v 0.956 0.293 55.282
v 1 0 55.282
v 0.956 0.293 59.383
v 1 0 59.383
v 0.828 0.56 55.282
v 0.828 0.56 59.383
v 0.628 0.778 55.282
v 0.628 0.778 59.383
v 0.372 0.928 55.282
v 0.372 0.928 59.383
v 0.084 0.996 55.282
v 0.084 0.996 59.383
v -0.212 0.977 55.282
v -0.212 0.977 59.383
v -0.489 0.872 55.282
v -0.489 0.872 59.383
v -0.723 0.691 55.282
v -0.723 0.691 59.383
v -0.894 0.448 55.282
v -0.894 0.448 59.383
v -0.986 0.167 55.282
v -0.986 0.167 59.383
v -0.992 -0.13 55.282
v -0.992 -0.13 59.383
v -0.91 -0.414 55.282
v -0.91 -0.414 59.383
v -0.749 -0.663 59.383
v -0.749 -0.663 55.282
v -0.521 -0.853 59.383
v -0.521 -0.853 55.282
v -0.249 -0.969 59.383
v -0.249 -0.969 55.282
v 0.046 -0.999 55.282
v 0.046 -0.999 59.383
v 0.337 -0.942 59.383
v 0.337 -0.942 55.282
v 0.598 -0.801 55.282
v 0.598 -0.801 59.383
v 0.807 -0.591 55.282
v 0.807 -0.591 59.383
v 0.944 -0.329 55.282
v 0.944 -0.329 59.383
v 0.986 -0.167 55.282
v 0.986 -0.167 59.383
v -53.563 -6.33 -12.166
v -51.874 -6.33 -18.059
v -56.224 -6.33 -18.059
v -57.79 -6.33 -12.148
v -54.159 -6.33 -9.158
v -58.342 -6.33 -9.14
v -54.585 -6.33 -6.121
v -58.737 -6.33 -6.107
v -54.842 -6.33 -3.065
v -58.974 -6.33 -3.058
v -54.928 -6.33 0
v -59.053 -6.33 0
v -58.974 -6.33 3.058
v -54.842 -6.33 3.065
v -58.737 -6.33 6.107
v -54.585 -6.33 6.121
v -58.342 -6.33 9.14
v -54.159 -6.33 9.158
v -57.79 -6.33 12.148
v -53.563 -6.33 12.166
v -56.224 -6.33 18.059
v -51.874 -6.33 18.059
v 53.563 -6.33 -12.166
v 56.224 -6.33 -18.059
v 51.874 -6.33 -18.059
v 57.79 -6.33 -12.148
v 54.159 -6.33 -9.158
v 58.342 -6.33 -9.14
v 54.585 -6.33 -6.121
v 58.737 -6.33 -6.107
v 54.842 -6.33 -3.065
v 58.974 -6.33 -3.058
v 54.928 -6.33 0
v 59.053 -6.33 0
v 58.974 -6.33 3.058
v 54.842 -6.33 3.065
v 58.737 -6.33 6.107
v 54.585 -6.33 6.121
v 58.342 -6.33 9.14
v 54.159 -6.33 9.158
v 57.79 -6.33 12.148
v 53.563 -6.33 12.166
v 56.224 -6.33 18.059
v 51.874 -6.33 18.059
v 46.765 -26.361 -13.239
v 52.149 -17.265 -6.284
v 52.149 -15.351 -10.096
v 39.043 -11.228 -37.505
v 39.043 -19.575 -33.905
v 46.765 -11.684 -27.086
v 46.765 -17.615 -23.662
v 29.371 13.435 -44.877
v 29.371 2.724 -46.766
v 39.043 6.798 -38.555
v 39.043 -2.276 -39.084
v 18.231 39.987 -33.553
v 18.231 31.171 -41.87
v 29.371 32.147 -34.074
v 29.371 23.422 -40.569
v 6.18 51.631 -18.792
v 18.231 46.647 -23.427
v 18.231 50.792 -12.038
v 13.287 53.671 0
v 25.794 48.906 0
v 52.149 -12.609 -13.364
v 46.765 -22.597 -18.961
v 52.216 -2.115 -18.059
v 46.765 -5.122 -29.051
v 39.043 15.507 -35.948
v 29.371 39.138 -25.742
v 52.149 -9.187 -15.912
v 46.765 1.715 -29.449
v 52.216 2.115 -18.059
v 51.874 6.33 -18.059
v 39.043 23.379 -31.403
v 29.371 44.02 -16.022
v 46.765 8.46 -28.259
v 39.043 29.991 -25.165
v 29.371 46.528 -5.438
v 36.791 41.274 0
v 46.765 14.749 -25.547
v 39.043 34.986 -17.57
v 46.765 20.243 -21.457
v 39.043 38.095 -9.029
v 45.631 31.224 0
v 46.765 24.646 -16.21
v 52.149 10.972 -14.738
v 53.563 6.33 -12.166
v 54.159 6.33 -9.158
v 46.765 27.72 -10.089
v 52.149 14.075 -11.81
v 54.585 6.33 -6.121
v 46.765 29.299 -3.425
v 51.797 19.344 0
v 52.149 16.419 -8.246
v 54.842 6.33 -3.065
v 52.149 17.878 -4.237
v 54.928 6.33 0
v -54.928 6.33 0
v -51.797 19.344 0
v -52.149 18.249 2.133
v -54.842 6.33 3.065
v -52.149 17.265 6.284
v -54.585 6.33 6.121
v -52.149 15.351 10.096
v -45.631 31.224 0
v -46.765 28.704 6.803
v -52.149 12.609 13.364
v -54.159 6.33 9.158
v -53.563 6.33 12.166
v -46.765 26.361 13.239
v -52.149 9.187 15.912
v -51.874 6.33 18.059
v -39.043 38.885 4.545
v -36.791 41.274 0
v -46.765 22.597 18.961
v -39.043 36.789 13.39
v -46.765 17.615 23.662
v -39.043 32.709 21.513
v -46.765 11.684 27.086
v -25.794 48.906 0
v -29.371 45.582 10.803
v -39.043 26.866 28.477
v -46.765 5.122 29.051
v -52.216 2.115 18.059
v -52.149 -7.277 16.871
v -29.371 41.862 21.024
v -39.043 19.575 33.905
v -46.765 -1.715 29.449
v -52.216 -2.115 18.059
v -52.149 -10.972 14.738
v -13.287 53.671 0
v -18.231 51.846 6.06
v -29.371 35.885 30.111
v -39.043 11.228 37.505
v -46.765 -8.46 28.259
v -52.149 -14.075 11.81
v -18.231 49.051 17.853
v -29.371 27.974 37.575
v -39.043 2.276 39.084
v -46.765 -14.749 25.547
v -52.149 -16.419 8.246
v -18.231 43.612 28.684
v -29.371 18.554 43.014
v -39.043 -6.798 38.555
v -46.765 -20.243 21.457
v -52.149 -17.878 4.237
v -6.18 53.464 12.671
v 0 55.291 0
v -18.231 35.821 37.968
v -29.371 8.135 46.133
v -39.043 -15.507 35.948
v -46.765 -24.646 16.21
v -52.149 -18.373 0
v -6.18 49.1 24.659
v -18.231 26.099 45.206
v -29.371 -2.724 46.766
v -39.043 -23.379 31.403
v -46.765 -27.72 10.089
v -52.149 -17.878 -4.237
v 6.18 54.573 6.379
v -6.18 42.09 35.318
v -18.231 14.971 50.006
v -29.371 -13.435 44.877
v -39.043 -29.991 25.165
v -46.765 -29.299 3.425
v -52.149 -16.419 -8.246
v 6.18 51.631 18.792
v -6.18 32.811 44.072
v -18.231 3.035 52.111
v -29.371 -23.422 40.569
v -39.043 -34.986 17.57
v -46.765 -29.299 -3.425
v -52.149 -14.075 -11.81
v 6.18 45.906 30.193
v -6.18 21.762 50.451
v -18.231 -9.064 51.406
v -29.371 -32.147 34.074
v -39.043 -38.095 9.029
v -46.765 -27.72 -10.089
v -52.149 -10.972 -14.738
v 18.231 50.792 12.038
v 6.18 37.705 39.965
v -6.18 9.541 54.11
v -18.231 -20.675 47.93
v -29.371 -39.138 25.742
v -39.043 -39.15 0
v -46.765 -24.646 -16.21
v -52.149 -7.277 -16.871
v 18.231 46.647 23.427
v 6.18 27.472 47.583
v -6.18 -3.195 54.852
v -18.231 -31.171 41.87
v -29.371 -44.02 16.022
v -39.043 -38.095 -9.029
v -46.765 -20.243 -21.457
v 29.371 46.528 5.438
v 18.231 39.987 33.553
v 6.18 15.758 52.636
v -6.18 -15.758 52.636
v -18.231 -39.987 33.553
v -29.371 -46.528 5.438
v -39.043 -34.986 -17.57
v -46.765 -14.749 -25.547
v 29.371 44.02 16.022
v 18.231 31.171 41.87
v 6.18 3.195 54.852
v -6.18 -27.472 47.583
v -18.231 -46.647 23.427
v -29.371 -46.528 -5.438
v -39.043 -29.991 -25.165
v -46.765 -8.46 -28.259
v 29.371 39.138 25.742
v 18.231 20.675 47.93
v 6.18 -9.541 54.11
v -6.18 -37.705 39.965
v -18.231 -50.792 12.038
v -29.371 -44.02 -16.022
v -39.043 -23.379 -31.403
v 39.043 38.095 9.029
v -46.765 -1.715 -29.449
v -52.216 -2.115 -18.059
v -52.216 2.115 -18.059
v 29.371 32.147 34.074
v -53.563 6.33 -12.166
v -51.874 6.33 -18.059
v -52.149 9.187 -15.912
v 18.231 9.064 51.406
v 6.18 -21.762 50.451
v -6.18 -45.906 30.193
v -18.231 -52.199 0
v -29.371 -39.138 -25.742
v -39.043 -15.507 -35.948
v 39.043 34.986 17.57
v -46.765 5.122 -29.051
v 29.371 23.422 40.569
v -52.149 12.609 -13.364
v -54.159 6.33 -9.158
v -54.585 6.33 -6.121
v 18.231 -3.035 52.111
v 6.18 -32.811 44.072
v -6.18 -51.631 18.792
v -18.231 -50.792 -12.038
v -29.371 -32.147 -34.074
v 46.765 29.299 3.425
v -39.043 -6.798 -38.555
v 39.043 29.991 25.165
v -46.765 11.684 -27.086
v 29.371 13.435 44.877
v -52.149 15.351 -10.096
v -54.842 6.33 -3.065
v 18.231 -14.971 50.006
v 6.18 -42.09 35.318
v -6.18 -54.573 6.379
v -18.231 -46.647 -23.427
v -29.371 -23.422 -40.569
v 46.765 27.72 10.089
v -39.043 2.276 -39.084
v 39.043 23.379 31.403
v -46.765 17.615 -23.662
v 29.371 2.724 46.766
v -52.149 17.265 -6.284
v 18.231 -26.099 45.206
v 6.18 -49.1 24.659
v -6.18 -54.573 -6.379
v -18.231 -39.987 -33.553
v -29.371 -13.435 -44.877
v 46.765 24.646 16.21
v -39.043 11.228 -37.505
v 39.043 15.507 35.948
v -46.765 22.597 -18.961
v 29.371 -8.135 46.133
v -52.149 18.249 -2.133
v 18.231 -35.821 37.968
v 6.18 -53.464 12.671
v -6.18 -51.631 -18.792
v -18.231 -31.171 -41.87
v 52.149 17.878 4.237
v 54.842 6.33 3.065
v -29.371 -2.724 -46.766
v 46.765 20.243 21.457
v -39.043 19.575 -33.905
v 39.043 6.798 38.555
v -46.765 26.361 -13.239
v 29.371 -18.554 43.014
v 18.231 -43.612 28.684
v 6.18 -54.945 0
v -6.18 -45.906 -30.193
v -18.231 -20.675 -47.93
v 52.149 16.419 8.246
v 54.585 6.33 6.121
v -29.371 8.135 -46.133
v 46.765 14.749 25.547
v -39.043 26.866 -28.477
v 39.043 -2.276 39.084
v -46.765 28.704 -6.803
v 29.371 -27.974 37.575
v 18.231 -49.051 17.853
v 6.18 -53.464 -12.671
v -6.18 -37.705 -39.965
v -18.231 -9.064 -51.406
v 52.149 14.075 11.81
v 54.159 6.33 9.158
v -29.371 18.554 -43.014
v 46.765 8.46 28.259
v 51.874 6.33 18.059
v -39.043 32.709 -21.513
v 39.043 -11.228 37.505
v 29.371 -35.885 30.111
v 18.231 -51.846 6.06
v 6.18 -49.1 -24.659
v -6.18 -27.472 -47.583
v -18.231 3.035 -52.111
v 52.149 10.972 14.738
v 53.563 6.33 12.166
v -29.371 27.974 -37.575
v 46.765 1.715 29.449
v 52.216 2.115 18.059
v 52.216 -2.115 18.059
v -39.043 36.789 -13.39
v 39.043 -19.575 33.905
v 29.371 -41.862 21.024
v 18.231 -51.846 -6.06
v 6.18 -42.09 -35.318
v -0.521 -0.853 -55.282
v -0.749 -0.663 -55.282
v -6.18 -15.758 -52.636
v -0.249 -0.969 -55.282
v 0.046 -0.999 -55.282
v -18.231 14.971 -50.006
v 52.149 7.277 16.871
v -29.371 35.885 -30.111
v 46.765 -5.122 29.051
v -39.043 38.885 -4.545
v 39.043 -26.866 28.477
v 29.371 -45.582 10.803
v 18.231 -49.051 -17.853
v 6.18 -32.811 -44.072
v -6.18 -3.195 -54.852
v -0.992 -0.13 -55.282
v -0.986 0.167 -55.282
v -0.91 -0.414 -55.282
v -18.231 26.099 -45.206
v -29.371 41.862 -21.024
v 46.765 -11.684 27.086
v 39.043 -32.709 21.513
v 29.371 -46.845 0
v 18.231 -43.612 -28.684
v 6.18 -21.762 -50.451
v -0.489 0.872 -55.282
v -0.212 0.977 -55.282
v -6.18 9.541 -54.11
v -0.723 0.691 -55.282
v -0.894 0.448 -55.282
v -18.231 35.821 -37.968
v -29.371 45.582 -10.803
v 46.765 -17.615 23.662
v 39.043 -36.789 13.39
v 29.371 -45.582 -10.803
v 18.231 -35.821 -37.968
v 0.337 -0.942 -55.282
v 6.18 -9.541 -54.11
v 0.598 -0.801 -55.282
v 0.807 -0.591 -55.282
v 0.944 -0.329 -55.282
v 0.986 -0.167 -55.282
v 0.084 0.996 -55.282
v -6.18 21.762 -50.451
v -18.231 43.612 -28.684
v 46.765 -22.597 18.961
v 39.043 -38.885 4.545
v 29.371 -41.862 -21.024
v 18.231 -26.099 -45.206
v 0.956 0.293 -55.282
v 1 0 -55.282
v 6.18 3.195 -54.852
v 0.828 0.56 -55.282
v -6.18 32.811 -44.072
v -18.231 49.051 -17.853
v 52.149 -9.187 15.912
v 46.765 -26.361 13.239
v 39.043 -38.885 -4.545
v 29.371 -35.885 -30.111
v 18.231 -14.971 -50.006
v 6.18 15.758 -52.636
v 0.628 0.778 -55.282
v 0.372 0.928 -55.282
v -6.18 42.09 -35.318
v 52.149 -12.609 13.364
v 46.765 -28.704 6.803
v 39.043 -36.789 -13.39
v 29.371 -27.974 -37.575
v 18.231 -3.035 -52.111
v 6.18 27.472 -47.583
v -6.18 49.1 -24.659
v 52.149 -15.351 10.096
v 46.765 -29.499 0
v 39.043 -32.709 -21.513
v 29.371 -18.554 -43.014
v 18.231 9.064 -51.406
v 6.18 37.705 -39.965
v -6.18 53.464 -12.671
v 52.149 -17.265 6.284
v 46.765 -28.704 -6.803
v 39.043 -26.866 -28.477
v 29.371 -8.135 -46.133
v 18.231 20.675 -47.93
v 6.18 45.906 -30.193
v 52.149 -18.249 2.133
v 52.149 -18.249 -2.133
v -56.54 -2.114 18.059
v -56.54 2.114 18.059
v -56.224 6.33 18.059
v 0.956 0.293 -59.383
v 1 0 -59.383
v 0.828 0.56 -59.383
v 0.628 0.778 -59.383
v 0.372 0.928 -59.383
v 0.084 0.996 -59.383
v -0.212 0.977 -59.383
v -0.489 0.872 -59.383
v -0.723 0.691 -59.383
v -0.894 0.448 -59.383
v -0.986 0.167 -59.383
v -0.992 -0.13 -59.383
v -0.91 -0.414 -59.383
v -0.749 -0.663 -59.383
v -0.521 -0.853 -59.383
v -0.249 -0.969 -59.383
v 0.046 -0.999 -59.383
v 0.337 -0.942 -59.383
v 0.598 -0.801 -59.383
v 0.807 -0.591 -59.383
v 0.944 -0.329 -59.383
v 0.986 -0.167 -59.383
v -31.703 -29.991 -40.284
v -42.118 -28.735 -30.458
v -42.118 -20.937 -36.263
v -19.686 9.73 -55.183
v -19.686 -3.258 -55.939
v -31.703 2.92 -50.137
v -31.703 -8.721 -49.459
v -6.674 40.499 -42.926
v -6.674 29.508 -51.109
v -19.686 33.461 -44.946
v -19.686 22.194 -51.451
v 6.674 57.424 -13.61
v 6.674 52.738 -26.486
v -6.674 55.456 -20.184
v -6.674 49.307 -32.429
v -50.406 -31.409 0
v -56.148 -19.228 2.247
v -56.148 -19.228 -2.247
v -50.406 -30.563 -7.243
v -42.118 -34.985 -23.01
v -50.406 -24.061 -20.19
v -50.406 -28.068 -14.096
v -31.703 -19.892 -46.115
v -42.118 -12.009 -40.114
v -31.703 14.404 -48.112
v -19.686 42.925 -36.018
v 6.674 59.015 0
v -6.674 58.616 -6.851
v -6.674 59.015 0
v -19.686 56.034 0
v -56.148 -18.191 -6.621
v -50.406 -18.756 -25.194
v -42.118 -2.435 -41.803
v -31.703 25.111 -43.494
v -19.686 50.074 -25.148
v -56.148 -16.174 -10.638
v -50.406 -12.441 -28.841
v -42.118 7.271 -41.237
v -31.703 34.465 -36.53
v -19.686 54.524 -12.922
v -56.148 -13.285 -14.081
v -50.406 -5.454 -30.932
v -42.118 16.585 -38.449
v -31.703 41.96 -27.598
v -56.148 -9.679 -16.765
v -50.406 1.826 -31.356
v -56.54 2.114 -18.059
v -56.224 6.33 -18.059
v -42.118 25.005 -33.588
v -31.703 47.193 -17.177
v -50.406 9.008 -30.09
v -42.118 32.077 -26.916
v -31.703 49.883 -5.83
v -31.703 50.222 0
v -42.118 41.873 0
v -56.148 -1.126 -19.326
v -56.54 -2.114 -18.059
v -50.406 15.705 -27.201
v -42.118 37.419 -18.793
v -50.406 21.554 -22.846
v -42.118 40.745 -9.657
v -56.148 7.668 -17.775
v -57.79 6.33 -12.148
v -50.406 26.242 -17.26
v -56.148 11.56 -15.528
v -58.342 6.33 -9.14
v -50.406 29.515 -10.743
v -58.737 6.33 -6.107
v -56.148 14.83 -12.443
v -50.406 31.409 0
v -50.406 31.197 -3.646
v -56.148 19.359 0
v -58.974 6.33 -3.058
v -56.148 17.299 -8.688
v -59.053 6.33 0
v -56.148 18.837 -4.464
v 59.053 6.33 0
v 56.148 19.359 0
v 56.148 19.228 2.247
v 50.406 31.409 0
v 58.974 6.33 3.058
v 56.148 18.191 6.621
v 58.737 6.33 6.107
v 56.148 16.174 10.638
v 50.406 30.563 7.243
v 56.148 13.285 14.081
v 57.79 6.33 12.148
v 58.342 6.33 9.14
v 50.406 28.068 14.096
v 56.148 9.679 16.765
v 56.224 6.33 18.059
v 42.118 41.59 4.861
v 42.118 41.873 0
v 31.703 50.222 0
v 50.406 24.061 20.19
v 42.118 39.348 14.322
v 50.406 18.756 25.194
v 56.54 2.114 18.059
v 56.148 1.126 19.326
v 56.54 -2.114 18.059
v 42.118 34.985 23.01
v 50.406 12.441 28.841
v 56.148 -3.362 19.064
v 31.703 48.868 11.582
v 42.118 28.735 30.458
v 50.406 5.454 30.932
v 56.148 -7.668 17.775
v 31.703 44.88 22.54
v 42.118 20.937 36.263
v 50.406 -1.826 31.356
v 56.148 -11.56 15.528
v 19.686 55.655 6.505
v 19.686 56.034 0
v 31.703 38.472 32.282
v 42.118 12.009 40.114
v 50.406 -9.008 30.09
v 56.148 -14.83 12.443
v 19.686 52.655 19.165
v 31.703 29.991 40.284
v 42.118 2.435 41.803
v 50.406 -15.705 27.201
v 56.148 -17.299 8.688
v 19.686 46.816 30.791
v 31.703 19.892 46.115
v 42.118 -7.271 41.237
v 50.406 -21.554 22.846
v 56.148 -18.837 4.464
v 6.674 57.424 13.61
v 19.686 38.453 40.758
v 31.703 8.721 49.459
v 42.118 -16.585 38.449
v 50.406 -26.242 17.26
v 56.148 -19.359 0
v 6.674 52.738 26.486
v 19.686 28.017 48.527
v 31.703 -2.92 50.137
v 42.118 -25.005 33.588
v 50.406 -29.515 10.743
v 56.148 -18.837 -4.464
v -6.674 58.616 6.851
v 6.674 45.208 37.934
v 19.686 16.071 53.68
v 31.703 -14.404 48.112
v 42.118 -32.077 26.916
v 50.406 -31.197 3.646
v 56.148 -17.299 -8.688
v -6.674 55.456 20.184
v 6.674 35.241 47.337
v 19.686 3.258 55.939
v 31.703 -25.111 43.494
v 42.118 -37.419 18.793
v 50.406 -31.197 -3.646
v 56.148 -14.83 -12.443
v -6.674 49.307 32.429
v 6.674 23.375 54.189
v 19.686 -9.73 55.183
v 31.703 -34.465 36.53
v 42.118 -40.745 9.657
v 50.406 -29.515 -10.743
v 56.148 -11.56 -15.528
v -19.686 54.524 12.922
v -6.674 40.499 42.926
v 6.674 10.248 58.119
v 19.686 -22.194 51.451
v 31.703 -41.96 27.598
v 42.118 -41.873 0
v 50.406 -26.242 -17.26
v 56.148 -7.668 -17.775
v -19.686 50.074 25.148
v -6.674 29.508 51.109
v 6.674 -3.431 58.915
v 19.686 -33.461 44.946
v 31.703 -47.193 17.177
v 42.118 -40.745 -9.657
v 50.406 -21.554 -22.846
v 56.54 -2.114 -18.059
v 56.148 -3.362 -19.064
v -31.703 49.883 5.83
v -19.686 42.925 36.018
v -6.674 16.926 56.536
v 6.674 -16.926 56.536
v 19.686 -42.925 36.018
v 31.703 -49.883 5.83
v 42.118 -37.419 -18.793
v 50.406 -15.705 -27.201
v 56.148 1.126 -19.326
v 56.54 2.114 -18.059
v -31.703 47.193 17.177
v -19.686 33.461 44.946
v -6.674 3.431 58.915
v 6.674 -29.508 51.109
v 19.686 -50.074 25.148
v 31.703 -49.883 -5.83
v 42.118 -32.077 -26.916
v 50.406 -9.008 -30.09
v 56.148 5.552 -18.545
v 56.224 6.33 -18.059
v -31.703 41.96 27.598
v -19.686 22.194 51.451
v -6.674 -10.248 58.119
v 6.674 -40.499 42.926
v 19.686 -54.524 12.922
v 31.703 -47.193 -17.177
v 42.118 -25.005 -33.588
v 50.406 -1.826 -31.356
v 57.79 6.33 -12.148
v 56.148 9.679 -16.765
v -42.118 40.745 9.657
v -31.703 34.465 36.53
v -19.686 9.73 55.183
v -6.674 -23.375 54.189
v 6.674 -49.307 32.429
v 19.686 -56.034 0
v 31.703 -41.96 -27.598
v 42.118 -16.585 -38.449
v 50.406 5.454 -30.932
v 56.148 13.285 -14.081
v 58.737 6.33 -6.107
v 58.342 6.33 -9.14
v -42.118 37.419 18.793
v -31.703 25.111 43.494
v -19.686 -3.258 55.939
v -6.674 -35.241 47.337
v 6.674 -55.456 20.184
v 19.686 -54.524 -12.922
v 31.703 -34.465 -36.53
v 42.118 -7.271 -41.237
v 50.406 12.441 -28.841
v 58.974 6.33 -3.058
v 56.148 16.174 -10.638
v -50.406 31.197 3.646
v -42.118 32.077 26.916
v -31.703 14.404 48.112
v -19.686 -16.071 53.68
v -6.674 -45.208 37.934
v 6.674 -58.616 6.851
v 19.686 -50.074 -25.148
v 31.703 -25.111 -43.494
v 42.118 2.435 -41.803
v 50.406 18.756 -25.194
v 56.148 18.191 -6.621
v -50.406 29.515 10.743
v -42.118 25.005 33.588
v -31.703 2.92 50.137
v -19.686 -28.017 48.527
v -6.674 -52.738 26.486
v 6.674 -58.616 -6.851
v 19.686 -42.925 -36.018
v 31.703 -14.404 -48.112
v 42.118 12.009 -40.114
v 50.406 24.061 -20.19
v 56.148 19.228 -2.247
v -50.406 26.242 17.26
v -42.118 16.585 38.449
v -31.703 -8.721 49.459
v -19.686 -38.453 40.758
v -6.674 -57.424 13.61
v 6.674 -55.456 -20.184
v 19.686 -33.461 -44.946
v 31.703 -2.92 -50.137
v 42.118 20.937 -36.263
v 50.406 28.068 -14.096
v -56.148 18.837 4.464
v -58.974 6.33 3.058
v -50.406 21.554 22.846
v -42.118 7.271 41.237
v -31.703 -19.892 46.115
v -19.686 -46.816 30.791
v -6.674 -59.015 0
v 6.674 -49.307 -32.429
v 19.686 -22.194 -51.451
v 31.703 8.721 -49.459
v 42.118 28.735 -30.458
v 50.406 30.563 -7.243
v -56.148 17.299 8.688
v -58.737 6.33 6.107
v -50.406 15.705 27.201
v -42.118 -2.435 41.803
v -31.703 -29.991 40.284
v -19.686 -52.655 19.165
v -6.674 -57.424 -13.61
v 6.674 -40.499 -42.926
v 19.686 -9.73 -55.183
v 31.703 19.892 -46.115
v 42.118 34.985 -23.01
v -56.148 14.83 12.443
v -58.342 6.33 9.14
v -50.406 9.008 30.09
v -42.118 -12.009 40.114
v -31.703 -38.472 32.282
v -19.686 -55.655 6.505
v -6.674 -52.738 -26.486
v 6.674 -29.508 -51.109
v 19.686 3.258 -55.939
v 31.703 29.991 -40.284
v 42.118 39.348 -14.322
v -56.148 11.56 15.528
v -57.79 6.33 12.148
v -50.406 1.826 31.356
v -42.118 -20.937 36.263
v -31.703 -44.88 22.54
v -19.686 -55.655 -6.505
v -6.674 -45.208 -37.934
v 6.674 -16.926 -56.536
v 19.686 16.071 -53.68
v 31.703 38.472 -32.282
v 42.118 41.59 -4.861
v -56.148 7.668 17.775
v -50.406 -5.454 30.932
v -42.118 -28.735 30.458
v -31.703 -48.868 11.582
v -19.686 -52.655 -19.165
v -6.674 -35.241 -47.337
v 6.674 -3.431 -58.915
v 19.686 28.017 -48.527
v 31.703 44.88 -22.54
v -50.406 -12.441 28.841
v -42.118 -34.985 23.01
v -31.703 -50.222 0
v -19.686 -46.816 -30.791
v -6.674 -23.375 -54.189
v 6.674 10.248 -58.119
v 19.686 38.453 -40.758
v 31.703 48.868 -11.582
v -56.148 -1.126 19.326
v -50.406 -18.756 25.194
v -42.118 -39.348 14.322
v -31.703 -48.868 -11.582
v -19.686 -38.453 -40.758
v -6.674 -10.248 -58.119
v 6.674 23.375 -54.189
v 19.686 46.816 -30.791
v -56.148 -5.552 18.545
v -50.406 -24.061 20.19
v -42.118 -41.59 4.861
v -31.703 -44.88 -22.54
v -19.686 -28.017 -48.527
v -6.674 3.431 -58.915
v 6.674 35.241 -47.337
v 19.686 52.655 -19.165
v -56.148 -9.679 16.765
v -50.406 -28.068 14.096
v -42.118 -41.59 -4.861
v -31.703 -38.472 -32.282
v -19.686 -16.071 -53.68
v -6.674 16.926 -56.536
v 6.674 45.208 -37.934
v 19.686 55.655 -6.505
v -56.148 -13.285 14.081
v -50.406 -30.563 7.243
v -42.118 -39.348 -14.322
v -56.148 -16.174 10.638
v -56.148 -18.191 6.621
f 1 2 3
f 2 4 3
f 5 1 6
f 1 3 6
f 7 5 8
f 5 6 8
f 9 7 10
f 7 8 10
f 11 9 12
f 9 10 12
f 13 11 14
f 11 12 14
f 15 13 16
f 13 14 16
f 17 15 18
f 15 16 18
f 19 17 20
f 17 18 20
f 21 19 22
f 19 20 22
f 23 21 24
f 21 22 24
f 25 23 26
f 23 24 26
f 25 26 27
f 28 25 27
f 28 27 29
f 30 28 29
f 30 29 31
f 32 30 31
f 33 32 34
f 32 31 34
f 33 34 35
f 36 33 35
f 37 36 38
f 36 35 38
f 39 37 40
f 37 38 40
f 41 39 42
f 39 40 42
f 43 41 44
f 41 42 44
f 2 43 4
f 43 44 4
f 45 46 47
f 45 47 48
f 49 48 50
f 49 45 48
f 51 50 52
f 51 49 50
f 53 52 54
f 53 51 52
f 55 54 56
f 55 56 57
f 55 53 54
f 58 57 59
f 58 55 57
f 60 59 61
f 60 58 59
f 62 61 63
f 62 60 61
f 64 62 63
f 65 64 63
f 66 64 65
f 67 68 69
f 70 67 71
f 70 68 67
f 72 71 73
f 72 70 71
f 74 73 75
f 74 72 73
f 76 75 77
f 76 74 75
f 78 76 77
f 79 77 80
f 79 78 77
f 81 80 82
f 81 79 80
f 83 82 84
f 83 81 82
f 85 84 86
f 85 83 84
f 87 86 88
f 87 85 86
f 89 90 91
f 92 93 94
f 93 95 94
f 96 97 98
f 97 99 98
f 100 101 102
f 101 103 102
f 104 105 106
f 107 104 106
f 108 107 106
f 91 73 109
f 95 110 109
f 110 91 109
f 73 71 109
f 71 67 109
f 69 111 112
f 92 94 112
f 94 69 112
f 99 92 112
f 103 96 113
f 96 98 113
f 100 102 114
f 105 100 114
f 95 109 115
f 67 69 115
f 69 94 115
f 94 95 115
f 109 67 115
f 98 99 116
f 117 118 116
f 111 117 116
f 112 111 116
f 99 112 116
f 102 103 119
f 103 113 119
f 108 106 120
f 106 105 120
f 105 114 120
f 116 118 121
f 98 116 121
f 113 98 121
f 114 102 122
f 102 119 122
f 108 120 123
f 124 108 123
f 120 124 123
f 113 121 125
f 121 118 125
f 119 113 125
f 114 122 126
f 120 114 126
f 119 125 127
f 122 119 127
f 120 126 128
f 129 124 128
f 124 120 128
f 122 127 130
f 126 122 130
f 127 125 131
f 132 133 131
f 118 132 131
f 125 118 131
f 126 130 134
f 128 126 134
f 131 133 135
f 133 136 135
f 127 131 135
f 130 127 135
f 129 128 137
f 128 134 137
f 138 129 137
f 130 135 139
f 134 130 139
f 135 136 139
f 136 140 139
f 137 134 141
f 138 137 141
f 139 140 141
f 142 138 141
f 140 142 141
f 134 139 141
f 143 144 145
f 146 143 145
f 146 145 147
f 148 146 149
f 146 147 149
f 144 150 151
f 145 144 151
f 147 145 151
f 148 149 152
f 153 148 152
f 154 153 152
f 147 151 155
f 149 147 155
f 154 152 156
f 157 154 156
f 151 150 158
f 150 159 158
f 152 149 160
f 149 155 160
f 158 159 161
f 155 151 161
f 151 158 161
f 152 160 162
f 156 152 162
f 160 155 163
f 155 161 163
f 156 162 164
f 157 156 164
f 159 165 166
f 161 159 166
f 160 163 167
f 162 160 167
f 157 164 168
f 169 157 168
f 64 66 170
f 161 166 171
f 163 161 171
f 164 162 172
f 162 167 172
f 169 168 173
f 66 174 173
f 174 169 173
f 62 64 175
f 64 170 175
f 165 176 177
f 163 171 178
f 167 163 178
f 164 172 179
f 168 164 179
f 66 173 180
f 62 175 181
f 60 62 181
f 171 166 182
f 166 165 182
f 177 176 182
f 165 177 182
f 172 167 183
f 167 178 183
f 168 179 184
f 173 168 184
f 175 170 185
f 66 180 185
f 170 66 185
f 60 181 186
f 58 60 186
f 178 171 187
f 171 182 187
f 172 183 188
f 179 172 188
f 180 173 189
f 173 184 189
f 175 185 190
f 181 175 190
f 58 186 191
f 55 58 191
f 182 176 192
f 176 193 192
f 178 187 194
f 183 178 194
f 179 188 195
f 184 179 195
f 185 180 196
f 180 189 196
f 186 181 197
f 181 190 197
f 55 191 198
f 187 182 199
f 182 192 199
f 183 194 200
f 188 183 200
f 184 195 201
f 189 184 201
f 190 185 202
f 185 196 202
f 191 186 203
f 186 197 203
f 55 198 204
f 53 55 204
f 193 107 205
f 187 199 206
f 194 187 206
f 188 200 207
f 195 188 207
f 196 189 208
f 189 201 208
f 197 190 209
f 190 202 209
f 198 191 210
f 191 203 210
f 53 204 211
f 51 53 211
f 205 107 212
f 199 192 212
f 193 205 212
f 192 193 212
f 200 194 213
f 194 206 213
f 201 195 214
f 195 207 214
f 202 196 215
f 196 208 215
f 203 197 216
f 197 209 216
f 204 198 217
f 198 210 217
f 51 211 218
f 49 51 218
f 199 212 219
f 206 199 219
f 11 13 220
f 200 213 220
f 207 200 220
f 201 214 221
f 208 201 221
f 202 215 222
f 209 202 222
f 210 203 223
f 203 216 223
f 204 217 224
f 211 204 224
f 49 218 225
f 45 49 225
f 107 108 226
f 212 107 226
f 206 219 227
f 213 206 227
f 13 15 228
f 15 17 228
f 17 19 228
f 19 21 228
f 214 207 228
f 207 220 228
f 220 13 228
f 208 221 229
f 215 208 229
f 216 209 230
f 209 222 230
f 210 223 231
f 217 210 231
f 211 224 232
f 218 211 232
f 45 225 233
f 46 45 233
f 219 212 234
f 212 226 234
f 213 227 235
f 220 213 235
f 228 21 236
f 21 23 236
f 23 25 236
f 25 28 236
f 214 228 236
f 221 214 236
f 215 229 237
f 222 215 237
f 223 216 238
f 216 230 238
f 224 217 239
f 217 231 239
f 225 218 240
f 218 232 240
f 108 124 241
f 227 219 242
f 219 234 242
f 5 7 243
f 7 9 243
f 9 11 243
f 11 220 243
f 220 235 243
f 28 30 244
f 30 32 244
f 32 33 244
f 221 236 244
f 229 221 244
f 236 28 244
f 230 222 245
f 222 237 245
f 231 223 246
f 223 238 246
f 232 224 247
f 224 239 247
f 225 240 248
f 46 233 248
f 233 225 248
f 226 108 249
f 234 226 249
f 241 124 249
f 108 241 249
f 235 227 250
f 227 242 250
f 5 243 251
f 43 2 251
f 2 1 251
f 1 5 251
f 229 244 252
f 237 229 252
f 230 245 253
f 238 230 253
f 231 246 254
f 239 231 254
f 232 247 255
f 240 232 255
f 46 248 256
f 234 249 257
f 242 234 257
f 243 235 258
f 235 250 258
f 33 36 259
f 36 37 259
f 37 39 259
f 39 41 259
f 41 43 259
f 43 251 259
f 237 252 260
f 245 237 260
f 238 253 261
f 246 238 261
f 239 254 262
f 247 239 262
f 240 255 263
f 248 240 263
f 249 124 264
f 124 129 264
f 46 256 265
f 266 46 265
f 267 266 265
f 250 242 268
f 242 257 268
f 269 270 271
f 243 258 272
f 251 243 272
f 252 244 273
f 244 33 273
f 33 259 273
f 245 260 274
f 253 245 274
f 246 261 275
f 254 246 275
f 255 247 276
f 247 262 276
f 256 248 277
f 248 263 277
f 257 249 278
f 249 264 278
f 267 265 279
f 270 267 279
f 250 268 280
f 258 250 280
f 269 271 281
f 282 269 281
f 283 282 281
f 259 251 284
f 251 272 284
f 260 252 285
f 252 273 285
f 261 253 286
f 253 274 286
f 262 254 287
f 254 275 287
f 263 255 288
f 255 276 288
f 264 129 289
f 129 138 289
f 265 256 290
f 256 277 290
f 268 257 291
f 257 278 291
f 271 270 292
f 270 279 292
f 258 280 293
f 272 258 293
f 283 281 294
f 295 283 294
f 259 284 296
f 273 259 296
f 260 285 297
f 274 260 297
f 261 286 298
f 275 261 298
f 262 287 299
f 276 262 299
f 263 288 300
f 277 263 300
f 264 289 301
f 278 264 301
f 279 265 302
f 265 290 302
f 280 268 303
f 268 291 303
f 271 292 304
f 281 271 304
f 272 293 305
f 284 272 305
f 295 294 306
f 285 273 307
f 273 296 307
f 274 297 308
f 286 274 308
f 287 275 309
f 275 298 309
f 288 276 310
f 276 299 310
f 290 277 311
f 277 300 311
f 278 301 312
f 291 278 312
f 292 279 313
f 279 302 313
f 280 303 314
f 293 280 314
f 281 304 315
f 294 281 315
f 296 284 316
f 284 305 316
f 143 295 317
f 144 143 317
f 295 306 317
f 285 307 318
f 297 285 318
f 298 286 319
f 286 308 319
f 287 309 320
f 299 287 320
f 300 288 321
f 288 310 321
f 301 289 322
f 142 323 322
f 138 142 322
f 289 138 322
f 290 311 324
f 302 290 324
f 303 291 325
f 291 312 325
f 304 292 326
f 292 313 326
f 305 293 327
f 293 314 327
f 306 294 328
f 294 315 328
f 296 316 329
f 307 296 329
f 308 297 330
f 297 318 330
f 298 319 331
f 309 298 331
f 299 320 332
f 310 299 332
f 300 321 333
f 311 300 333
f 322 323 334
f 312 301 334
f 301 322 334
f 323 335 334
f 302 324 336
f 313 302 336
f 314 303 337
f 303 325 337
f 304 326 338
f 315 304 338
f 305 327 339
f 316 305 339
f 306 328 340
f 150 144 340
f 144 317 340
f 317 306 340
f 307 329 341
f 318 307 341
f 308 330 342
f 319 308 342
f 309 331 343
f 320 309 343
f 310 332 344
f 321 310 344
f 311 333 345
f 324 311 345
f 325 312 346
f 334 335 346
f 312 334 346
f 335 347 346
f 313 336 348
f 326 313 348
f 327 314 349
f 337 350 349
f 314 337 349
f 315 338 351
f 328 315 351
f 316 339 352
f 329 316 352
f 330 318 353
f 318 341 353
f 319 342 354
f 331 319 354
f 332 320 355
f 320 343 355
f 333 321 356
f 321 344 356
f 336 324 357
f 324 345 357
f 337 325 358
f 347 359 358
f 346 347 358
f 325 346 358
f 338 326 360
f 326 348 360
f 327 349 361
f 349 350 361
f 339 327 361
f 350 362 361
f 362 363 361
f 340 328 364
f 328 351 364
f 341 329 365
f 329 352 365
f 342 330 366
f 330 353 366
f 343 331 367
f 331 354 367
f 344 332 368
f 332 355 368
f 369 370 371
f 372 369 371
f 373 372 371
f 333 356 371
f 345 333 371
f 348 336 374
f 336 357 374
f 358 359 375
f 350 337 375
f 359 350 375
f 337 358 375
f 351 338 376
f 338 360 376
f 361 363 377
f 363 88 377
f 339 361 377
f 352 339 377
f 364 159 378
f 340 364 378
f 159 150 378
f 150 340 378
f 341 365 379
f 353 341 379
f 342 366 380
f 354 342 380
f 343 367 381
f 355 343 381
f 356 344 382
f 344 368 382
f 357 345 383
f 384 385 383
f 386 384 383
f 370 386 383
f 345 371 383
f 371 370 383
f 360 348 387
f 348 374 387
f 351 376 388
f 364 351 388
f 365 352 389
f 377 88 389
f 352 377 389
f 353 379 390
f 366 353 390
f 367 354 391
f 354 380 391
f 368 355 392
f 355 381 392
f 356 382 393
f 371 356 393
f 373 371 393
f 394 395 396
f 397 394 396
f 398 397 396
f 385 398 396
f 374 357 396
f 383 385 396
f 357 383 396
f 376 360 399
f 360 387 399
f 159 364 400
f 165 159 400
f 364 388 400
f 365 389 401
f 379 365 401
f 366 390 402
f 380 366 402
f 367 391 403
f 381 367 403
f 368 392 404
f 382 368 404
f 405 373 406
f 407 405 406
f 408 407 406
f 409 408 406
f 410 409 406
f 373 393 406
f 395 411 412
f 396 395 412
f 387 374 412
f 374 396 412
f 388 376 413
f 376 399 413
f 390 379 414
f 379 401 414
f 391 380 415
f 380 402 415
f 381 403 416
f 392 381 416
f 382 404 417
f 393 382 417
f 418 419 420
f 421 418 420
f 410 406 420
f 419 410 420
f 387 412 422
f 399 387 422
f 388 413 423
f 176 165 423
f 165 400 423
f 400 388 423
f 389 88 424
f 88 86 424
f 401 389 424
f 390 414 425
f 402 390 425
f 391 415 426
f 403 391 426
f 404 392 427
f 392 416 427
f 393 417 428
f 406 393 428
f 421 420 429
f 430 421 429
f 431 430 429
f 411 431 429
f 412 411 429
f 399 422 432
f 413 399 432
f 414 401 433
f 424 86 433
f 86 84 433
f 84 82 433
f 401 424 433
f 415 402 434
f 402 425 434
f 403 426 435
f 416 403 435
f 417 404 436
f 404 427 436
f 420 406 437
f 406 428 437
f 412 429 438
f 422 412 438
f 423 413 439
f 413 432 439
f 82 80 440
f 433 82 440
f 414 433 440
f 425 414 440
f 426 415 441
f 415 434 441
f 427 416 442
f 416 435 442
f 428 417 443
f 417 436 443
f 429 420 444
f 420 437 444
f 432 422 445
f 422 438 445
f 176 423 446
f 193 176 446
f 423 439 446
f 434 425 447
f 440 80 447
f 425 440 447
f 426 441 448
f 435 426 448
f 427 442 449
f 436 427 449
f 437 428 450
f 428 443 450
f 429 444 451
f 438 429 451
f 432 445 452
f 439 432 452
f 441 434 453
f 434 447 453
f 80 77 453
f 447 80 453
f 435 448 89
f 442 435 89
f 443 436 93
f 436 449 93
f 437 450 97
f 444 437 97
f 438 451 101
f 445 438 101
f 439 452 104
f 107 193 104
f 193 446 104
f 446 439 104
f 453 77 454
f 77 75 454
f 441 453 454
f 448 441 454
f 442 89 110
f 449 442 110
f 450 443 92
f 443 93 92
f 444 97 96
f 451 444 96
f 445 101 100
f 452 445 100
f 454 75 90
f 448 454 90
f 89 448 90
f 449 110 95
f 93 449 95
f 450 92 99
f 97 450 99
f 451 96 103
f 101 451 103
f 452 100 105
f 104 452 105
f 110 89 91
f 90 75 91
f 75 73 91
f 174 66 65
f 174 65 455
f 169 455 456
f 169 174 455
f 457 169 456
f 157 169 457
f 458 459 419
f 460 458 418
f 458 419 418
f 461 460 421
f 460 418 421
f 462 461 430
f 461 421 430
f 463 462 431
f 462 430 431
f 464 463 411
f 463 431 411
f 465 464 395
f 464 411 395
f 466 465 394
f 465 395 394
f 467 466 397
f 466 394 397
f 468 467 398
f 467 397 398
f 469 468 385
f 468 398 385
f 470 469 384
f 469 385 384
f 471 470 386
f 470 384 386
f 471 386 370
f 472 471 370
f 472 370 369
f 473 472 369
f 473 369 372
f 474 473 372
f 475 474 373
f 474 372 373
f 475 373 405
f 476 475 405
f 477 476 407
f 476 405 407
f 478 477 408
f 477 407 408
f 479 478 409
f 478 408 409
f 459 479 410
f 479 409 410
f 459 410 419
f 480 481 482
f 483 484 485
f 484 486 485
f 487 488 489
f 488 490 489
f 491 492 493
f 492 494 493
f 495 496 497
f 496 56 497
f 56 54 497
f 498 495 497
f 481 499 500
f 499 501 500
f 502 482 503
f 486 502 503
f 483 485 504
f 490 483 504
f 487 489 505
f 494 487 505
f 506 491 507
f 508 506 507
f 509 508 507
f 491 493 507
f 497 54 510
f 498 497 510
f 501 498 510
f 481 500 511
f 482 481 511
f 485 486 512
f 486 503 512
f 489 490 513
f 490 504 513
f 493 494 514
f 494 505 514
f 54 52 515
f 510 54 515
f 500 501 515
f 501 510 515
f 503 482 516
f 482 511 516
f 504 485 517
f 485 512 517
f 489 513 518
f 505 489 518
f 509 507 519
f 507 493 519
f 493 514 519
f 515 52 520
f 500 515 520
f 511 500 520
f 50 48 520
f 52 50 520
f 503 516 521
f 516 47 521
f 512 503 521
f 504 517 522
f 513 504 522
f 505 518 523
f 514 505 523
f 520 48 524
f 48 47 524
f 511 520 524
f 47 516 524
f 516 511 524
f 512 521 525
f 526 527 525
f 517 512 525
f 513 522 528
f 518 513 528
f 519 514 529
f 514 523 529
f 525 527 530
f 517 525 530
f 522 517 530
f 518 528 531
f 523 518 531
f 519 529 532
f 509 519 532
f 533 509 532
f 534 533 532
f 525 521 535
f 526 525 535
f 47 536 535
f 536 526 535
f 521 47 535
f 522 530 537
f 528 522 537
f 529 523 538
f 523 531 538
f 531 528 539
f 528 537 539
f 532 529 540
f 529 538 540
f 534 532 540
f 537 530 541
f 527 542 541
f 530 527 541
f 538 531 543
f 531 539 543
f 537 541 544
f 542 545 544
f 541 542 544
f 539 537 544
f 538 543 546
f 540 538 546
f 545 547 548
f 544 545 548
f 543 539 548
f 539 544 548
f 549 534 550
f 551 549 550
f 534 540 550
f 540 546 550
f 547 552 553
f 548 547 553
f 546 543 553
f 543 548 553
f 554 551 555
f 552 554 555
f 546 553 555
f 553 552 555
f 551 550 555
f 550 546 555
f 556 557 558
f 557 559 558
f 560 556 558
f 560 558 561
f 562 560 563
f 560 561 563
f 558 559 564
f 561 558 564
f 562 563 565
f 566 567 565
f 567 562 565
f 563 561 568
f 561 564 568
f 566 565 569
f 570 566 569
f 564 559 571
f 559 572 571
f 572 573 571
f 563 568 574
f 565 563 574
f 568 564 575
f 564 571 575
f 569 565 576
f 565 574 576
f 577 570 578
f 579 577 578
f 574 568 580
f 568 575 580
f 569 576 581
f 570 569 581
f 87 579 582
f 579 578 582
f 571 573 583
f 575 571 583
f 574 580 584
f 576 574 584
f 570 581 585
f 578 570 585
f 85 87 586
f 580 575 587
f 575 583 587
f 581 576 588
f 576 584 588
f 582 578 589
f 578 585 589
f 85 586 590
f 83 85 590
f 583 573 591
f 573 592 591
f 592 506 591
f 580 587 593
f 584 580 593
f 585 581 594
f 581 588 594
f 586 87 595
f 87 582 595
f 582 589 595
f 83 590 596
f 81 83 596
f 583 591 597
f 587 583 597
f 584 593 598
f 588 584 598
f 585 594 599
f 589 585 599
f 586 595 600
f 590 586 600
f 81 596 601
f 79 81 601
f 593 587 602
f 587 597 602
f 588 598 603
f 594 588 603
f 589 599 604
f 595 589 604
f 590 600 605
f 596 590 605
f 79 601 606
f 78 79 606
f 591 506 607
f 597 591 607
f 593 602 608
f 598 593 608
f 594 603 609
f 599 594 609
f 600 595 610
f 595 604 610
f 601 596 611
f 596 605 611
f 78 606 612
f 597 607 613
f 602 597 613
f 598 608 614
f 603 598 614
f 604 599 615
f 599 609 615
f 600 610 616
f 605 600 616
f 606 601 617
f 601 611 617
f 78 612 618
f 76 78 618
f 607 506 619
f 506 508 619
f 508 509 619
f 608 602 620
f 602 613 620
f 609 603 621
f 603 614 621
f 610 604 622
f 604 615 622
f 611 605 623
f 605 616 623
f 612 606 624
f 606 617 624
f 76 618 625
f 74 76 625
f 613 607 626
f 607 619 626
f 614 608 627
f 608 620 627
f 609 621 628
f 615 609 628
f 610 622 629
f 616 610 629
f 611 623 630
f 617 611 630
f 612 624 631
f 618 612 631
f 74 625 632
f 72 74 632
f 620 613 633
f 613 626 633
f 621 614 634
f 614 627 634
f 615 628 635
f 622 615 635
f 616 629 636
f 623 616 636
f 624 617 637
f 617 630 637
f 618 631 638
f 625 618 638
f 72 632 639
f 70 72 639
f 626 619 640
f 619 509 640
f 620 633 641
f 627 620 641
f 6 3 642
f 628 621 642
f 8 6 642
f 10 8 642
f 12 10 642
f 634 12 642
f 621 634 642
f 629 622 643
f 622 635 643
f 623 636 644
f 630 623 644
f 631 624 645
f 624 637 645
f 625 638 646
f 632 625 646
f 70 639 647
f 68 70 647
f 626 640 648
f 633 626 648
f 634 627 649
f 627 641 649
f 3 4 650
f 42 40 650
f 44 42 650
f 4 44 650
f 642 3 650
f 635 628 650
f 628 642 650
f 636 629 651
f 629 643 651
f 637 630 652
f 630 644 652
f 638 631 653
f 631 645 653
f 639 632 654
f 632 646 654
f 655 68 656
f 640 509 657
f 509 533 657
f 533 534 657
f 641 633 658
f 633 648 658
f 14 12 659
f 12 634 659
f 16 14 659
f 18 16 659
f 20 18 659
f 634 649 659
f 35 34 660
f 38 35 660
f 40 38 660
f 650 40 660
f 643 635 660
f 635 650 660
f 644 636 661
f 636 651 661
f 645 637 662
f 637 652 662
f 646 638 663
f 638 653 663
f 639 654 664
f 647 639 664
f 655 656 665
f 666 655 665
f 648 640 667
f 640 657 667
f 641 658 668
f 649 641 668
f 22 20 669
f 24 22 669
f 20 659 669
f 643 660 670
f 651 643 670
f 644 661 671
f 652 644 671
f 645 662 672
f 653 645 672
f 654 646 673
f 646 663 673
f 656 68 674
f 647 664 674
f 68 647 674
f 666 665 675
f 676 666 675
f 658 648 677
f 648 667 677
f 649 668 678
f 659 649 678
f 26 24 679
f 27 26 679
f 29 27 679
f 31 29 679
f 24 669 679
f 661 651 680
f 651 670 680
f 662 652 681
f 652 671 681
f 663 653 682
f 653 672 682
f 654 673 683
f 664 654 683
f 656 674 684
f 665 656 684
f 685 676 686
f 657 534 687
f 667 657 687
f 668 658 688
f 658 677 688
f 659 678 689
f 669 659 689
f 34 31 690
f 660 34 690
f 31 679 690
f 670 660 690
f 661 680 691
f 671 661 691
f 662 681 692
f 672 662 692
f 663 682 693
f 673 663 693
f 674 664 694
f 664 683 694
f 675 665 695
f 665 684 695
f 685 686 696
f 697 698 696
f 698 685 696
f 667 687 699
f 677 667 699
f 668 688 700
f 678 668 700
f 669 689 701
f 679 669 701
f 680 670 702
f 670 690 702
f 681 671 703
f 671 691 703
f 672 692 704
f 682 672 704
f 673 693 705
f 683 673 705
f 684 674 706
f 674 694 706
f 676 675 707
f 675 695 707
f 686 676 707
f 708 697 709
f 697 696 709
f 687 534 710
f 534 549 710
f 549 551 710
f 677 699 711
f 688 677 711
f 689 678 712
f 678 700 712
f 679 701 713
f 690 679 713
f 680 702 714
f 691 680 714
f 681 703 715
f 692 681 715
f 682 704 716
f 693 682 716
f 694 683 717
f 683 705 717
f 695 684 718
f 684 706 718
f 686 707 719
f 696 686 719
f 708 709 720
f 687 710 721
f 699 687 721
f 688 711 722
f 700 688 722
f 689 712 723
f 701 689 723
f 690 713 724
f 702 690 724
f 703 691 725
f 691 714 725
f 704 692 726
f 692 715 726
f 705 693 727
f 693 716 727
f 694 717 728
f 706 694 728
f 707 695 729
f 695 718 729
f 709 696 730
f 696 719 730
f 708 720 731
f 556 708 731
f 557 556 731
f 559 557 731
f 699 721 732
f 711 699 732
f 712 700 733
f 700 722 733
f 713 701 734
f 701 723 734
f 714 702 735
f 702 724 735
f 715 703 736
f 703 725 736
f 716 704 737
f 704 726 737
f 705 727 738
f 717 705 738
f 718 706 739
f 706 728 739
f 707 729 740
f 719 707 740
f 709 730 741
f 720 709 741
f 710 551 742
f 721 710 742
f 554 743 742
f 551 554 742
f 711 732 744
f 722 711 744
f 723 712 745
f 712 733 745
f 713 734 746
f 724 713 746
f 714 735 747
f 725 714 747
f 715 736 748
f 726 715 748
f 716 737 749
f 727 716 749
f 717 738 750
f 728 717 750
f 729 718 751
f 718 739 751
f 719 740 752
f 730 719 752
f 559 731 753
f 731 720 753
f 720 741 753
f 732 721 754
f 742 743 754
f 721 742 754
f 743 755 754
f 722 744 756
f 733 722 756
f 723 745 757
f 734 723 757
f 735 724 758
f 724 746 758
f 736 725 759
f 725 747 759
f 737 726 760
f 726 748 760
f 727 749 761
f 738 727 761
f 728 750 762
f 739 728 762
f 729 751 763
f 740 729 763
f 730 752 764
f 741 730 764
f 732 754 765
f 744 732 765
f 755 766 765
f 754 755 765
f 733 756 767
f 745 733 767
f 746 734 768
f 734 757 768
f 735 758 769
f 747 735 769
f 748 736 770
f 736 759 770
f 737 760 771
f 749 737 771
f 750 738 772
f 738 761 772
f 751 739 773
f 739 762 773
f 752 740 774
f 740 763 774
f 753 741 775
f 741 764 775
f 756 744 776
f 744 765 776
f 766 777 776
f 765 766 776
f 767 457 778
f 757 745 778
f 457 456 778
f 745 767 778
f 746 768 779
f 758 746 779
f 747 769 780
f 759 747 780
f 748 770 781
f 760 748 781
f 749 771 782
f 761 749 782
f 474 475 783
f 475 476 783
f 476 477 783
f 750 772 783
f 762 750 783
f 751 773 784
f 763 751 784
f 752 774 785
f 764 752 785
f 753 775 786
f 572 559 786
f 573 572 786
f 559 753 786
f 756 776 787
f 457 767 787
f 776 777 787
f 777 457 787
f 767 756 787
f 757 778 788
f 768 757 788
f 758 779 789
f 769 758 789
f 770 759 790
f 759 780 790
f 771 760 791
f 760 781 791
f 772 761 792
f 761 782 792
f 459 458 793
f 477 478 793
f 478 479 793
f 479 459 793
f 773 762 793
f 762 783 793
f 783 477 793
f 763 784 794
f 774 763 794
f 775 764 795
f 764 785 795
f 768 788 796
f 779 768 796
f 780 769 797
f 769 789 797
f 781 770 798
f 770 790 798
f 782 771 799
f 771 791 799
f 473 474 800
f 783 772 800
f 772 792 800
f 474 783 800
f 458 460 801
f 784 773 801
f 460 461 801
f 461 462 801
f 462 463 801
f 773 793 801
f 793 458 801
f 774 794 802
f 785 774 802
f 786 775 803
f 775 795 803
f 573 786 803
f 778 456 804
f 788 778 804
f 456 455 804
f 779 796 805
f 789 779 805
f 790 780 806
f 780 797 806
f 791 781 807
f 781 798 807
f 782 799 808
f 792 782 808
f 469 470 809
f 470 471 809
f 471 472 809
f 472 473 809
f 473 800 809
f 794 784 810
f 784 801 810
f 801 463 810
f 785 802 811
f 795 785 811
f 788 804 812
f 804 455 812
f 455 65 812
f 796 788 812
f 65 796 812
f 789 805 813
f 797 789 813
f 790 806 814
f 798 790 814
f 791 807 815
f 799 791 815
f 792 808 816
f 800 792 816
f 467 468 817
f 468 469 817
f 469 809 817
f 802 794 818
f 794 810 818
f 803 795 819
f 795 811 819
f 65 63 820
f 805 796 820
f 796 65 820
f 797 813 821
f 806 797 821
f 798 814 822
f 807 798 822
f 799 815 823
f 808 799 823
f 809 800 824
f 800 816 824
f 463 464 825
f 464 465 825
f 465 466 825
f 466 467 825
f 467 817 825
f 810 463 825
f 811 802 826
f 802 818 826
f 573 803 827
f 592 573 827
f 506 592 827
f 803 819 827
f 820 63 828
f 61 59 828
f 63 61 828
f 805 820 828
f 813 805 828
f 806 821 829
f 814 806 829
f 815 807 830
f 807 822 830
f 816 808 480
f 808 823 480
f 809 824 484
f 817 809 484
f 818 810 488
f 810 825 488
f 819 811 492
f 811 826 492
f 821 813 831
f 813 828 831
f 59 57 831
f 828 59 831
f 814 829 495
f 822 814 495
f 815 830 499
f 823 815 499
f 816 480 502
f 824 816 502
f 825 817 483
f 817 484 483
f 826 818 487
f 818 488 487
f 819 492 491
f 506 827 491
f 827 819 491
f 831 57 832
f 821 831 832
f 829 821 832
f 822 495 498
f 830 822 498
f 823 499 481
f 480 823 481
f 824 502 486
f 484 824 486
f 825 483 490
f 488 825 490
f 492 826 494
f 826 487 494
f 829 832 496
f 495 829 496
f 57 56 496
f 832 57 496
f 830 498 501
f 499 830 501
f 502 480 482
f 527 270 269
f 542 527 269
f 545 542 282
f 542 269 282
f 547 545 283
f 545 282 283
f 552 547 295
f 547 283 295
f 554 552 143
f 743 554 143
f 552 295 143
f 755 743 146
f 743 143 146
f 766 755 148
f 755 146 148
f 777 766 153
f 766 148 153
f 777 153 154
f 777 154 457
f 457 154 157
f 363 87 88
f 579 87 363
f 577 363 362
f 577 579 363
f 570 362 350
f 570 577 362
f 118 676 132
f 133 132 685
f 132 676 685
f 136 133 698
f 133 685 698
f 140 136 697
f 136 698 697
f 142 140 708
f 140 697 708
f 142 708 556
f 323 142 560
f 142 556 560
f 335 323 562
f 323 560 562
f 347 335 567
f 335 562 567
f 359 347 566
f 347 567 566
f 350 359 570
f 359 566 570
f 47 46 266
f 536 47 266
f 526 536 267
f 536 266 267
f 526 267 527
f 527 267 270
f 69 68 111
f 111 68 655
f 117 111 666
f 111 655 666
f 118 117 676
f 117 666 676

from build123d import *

# Parameters (mm, degrees)
F3_R     = 1
F4_DEPTH = 100
F7_W     = 12.659744
F7_H     = 36.118894
F8_DEPTH = 118.783902


with BuildPart() as f2:
    # F0 (on Top) → F2 (revolve)
    with BuildSketch(Plane.XY):
        with BuildLine():
            ThreePointArc((-55.291078, 0), (0, 55.291078), (55.291078, 0))
            Line((55.291078, 0), (59.391451, 0))
            ThreePointArc((59.391451, 0), (0, 59.391451), (-59.391451, 0))
            Line((-59.391451, 0), (-55.291078, 0))
        make_face()
    revolve(axis=Axis((34.508616, 0, 0), (1, 0, 0)))


with BuildPart() as f4:
    # F3 (on Top) → F4 (new body, symmetric)
    with BuildSketch(Plane.XY):
        Circle(F3_R)
    extrude(amount=F4_DEPTH, both=True)


with BuildPart() as f2_1:
    add(f2.part)

    # F5: cut F4
    add(f4.part, mode=Mode.SUBTRACT)

    # F7 (on plane+point) → F8 (cut, through all)
    with BuildSketch(Plane.YZ.offset(59.391451)):
        Rectangle(F7_W, F7_H)
    extrude(amount=-F8_DEPTH, mode=Mode.SUBTRACT)


solid = f2_1.part
